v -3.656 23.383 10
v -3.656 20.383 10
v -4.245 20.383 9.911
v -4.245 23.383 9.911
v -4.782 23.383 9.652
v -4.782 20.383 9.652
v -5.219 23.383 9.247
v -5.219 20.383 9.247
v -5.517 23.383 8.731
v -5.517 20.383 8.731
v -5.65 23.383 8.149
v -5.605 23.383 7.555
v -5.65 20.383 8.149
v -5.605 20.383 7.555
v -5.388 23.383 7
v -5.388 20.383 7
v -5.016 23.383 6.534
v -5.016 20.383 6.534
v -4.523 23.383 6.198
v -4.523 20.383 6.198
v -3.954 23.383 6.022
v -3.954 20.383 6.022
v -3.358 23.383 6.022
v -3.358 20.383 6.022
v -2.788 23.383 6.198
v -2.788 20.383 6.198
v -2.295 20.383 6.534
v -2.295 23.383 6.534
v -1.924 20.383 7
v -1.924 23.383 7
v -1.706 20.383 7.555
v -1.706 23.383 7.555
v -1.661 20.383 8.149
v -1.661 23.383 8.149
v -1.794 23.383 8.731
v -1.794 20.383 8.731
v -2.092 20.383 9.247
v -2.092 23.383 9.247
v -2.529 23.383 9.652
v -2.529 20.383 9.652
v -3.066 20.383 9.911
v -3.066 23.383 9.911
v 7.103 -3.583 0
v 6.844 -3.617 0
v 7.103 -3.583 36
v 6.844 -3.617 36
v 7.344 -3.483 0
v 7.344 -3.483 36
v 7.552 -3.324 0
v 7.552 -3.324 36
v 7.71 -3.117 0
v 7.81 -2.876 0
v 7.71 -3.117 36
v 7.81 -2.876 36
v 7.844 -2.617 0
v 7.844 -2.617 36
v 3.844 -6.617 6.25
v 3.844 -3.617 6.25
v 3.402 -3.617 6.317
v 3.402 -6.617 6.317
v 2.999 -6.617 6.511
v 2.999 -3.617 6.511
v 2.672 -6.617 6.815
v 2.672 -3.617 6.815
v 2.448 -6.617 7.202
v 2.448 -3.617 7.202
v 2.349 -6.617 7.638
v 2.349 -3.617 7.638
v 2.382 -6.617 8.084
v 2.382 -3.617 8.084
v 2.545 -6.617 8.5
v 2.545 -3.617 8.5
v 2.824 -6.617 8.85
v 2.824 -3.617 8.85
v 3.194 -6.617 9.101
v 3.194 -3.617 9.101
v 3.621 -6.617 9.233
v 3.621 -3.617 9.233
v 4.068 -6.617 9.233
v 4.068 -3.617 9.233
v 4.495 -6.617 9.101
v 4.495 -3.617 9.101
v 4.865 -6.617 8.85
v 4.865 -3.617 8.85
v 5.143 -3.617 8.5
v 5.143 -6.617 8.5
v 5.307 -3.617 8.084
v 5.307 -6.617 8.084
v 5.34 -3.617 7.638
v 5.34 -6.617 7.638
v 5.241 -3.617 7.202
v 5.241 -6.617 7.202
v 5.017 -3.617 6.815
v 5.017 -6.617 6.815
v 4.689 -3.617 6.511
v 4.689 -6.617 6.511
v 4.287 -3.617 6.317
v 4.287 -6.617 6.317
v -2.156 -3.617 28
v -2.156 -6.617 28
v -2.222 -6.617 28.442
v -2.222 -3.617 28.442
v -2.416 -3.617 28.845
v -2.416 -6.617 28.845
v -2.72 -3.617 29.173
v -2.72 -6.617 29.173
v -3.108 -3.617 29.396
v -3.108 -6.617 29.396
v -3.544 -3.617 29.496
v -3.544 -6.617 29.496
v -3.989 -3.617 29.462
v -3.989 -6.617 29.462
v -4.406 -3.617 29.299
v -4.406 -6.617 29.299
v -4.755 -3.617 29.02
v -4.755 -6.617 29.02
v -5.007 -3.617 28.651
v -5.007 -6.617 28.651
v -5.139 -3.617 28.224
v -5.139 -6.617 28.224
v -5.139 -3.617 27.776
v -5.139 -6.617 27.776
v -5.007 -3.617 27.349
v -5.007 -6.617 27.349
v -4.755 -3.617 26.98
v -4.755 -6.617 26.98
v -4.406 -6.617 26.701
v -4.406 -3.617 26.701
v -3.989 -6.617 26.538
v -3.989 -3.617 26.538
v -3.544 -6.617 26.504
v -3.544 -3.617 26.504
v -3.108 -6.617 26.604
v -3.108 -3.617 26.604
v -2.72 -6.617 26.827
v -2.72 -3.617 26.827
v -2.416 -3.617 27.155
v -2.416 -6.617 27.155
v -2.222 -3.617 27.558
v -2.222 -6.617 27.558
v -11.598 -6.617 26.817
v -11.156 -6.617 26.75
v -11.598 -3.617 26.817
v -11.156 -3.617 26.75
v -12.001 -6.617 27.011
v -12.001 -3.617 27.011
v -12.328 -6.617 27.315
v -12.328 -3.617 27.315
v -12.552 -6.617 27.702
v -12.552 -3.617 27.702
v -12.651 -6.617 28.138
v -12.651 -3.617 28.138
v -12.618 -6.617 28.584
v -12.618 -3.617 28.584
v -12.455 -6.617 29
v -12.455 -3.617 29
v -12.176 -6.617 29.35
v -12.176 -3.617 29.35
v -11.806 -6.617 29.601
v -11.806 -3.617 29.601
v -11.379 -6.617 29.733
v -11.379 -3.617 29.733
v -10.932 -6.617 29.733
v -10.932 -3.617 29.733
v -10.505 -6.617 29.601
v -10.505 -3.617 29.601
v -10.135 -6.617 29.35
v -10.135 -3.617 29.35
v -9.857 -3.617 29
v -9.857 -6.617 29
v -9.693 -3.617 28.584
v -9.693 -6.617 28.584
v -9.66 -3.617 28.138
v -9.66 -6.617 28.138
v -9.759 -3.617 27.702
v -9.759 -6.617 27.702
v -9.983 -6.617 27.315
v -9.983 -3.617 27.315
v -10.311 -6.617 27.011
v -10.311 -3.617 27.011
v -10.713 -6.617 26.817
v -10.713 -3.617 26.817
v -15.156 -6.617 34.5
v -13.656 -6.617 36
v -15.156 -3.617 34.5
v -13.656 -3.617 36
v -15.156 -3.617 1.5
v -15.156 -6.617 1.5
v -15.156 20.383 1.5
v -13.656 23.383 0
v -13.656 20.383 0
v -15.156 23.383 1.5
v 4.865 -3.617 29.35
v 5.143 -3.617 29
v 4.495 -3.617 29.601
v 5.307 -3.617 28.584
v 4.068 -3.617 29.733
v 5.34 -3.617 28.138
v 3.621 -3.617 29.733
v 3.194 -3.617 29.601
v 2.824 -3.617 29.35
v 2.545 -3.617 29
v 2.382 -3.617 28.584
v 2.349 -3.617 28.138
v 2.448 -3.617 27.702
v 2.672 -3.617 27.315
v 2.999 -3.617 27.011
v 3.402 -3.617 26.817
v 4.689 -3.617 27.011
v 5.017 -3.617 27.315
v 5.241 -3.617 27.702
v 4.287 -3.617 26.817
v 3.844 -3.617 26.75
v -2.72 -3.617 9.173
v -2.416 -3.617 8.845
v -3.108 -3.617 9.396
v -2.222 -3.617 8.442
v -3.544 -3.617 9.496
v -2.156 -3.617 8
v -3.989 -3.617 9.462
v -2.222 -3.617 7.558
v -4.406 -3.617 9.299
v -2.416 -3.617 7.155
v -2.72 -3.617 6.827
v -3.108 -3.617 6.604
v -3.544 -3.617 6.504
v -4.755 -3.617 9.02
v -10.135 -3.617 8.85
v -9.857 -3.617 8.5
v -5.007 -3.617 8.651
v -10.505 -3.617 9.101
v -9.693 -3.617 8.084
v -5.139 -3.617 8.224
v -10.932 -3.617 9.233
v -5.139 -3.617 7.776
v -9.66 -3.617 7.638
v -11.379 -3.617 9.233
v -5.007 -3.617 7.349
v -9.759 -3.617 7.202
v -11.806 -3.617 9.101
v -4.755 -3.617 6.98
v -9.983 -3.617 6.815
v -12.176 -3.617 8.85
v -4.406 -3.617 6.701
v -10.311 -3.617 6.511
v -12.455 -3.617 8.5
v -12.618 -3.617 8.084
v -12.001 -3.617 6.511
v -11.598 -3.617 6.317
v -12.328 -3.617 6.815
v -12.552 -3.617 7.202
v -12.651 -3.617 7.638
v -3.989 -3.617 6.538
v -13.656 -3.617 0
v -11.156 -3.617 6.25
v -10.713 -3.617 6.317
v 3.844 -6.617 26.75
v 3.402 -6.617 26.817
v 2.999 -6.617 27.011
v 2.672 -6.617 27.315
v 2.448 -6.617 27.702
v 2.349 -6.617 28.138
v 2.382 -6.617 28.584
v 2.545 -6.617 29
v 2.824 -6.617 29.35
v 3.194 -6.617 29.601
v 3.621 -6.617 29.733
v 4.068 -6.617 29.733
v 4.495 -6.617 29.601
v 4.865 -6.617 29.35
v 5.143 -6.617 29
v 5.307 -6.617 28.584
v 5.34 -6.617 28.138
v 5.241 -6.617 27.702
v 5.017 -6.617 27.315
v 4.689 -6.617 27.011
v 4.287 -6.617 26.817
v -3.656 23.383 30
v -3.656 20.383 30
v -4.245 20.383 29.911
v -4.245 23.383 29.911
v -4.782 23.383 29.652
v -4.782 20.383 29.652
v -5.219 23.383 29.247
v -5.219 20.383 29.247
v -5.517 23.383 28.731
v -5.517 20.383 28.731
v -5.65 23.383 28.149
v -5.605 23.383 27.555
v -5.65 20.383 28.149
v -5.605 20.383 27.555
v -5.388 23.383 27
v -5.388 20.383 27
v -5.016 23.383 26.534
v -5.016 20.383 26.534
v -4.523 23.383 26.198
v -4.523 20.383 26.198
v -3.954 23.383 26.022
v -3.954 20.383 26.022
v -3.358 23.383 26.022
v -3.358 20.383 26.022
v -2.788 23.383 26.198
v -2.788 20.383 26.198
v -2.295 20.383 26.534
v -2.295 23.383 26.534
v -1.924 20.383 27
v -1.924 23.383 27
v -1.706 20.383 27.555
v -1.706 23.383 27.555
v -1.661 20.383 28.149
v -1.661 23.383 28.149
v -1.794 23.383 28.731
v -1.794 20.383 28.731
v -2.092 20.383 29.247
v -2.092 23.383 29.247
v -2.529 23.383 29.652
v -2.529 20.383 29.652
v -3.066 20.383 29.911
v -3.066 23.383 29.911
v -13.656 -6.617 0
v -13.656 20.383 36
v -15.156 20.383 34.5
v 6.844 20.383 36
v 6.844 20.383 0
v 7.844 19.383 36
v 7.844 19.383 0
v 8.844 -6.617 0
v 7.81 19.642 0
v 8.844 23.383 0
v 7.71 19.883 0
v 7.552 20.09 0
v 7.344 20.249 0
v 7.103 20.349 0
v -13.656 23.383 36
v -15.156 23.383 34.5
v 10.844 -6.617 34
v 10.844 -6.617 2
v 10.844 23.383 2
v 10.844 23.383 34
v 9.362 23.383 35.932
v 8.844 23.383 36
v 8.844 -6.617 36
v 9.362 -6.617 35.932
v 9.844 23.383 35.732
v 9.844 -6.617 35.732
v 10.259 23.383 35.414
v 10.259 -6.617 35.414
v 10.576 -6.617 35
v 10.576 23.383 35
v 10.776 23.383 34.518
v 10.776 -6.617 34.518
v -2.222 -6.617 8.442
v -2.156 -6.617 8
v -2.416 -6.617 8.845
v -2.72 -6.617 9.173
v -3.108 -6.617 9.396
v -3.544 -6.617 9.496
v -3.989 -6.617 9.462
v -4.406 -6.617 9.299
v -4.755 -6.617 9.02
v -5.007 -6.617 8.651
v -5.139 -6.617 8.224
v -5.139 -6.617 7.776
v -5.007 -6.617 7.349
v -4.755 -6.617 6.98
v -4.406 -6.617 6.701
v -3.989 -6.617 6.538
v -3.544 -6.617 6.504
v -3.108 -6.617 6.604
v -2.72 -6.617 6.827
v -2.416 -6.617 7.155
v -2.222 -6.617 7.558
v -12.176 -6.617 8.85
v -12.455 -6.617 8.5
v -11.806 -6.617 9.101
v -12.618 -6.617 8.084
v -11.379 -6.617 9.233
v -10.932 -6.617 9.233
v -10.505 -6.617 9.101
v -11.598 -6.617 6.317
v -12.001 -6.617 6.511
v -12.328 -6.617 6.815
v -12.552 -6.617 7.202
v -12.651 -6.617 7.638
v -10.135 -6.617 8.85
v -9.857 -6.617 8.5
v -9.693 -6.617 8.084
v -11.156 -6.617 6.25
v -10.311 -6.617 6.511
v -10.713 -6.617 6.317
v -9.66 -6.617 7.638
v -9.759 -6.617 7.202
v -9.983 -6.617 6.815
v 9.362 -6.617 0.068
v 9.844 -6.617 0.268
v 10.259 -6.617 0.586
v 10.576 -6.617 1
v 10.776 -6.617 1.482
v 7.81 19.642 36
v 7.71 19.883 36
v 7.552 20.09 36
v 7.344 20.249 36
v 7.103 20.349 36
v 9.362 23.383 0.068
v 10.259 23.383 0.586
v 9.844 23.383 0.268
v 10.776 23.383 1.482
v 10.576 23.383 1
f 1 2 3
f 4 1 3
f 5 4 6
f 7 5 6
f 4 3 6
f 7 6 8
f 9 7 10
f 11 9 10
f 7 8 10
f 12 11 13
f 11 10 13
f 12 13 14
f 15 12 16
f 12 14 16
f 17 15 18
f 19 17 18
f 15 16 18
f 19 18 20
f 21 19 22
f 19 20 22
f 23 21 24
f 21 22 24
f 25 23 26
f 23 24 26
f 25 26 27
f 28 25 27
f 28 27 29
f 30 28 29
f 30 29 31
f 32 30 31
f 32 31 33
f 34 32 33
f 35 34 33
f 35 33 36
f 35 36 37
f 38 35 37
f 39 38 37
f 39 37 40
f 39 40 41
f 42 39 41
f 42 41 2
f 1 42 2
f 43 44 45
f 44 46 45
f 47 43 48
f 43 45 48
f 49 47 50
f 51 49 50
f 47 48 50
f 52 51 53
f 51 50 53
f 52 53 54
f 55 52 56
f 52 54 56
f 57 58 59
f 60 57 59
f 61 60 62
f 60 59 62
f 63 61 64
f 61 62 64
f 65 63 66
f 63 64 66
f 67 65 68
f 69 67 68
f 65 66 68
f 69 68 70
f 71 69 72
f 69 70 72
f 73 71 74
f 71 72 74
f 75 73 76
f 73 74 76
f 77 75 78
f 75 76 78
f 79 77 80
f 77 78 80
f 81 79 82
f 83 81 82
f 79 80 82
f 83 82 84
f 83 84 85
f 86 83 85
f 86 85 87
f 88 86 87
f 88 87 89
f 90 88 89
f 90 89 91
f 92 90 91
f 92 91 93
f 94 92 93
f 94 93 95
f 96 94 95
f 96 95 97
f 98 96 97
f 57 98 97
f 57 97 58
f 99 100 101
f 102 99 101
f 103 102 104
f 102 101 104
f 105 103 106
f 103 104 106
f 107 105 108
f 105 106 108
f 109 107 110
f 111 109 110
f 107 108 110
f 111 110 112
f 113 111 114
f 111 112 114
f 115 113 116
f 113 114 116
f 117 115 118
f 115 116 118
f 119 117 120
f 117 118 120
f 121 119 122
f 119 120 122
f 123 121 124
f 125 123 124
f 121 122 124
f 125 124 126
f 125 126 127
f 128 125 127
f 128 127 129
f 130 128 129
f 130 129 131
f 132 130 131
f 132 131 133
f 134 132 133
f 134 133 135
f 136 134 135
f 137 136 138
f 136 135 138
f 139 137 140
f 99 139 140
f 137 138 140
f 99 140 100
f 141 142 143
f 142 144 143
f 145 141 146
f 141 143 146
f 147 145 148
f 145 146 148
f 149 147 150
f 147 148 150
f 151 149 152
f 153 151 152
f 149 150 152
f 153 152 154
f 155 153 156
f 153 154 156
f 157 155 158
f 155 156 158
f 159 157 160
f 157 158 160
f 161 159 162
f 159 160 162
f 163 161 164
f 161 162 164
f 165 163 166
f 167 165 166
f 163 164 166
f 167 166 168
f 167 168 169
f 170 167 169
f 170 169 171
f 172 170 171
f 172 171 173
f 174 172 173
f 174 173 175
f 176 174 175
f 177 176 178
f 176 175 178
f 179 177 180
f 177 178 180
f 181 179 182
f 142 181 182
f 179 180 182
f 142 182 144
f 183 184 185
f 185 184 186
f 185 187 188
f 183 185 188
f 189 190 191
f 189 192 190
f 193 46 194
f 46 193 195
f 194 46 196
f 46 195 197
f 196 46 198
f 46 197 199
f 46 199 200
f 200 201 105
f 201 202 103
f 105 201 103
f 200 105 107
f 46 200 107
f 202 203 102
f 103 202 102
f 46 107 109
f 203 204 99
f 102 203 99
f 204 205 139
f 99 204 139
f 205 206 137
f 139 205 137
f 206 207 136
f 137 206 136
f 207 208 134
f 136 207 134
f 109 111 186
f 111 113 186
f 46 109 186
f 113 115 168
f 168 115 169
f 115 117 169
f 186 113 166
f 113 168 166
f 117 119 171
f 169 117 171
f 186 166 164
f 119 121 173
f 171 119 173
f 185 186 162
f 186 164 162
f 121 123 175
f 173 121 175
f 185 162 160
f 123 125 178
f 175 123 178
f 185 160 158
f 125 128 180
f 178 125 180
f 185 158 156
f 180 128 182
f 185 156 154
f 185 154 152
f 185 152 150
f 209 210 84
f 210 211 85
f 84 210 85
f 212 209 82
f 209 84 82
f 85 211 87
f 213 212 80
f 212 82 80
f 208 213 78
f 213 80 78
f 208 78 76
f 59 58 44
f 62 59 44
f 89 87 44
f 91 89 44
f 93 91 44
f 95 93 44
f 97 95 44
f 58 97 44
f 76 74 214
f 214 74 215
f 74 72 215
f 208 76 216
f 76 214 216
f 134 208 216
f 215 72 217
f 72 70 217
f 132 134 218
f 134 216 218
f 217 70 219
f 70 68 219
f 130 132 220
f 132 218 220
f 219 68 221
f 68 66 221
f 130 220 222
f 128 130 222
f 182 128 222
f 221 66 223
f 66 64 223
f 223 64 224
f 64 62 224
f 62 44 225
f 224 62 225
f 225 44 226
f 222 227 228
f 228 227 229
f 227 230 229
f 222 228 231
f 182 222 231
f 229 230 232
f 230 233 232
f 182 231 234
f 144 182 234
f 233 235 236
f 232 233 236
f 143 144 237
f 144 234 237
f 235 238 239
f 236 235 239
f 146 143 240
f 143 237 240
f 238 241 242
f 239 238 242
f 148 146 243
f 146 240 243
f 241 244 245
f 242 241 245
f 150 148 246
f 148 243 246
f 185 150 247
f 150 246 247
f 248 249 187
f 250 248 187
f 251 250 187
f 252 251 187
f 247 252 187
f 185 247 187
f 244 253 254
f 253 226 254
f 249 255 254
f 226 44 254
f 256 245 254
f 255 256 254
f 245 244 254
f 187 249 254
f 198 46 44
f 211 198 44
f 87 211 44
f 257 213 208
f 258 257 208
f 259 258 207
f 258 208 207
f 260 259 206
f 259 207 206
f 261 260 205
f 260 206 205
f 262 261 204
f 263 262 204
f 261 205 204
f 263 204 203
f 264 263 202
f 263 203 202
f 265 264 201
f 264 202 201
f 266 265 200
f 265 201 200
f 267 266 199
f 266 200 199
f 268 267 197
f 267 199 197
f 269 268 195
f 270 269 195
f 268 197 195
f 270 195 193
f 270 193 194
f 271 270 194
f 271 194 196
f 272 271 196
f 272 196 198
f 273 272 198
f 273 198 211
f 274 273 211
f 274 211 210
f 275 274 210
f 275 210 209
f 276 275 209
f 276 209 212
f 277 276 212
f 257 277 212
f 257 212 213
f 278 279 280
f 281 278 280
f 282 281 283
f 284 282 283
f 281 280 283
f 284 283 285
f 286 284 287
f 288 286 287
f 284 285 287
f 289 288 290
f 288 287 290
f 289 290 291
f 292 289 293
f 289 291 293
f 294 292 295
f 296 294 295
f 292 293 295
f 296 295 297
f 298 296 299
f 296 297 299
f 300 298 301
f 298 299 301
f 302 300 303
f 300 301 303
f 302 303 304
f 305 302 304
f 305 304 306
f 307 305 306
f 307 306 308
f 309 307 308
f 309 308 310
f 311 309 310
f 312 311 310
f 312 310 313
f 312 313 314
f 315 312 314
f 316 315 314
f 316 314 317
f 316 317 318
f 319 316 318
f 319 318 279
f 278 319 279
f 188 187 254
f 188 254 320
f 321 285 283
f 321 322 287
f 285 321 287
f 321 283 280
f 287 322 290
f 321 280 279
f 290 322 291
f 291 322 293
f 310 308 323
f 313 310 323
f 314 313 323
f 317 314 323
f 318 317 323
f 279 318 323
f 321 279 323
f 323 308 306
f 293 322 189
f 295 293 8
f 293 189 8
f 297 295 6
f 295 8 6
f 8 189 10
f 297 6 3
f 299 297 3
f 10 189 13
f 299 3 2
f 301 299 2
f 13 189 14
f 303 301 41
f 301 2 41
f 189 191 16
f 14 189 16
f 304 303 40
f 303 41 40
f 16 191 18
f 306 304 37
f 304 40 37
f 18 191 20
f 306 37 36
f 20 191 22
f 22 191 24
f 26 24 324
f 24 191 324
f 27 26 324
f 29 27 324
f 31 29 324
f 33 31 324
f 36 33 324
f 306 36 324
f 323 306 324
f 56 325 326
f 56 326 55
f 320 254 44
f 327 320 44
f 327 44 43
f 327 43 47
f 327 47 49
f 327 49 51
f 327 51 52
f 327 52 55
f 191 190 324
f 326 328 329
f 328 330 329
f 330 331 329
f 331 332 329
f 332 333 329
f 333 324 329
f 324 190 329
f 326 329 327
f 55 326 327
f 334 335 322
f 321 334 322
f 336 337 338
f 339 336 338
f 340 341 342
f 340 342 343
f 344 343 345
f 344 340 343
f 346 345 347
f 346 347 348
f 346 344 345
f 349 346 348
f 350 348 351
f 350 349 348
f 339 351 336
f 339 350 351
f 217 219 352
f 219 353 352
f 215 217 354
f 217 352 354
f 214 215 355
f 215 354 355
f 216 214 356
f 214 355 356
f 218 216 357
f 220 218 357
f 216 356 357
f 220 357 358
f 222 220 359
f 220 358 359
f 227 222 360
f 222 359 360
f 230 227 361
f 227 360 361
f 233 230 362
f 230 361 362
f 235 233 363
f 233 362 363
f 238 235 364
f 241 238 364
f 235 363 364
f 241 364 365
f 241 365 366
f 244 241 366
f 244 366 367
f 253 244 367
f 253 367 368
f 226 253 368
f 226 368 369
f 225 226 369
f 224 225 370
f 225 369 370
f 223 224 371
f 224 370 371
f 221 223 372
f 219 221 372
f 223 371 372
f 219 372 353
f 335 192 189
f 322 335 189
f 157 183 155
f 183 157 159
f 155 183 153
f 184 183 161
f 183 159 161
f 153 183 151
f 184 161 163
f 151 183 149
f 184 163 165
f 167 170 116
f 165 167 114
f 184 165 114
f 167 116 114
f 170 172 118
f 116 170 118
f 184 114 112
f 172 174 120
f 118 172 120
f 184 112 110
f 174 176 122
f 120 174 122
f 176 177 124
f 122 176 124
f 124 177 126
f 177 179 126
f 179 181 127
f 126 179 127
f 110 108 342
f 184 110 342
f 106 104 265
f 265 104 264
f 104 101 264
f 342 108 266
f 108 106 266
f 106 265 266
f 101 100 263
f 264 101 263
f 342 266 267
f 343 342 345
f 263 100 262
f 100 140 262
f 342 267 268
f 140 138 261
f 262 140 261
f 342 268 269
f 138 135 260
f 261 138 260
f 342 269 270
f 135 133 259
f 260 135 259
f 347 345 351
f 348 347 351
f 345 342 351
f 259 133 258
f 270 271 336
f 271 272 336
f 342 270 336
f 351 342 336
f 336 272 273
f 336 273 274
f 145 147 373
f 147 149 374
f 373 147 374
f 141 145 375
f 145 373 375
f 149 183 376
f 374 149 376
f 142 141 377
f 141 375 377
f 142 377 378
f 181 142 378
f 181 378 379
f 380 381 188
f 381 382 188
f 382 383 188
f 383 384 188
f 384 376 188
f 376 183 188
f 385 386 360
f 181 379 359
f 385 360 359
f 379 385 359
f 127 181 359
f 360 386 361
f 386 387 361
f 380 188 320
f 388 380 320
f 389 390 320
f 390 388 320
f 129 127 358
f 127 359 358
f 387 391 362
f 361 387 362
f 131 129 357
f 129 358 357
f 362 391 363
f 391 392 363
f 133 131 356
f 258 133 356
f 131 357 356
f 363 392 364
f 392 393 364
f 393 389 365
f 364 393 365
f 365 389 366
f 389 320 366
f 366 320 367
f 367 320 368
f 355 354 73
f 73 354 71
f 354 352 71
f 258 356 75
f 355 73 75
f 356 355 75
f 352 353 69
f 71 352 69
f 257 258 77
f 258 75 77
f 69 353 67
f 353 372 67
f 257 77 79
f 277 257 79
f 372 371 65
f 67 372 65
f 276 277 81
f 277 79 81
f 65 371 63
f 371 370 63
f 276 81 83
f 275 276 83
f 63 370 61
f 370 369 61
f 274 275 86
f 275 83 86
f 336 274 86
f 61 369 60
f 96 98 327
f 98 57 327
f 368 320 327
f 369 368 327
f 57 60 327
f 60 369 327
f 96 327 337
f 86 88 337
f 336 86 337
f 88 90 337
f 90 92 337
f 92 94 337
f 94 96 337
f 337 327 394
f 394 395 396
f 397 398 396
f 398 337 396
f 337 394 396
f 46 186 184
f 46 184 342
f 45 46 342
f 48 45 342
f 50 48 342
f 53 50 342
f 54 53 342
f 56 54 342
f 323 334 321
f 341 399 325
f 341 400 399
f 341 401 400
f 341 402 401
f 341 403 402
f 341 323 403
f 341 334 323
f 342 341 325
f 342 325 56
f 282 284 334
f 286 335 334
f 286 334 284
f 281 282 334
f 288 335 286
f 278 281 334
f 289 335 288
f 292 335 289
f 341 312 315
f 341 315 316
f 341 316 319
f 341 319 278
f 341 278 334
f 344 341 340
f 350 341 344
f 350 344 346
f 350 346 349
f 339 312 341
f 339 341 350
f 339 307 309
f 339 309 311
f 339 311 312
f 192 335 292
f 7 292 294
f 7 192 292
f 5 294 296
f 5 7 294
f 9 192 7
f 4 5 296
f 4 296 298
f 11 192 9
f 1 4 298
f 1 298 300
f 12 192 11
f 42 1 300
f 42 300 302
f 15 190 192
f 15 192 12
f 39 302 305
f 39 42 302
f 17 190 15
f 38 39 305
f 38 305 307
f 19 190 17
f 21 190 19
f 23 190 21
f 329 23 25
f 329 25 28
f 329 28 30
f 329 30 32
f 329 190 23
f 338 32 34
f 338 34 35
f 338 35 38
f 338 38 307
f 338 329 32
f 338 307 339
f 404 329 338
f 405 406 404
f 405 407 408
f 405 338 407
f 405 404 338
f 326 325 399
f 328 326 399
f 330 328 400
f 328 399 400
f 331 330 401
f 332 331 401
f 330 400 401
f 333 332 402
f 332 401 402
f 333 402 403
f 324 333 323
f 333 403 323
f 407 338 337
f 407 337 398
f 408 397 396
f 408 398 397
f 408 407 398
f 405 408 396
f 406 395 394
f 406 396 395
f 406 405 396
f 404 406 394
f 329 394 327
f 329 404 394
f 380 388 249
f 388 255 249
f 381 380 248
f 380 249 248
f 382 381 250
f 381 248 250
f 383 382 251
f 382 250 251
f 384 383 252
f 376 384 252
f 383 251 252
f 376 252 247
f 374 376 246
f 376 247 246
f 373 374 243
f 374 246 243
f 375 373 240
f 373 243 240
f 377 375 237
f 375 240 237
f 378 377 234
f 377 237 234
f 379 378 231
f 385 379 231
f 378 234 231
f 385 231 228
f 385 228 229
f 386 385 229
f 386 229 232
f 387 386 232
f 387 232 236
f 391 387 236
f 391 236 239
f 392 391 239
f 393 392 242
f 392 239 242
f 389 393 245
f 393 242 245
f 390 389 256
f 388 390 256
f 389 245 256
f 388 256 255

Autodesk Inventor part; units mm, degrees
ref_plane "YZ Plane" through (0, 0, 0) normal (1, 0, 0) x (0, 1, 0)
ref_plane "XZ Plane" through (0, 0, 0) normal (0, 1, 0) x (-1, 0, 0)
ref_plane "XY Plane" through (0, 0, 0) normal (0, 0, 1) x (1, 0, 0)
sketch "Szkic1" plane through (0, 0, 0) normal (0, 0, 1) x (1, 0, 0)
  line L0 (-15.1556, -3.6171) -> (-15.1556, -6.6171)
  line L1 (-15.1556, -6.6171) -> (10.8444, -6.6171)
  line L2 (10.8444, -6.6171) -> (10.8444, 23.3829)
  line L3 (7.8444, 20.3829) -> (7.8444, -3.6171)
  line L4 (7.8444, -3.6171) -> (-15.1556, -3.6171)
  line L5 (-15.1556, 23.3829) -> (-15.1556, 20.3829)
  line L6 (-15.1556, 20.3829) -> (7.8444, 20.3829)
  line L7 (-15.1556, 23.3829) -> (10.8444, 23.3829)
  point P0 (0, 0)
  dimension "d1" = 26
  dimension "d2" = 30
  dimension "d87" = 3
  dimension "d88" = 24
  dimension "d89" = 3
  dimension "d90" = 3
extrude "Wyciągnięcie proste1" add sketch "Szkic1" along normal blind 36
fillet "Zaokrąglenie1" radius 1 2 edges at (7.8444, -3.6171, 18) (7.8444, 20.3829, 18)
chamfer "Faza4" distance 1.5 angle 45 4 edges at (-15.1556, -5.1171, 36) (-15.1556, -5.1171, 0) (-15.1556, 21.8829, 36) (-15.1556, 21.8829, 0)
fillet "Zaokrąglenie5" radius 2 2 edges at (10.8444, 8.3829, 36) (10.8444, 8.3829, 0)
sketch "Szkic7" plane through (-15.1556, -6.6171, 1.5) normal (0, -1, 0) x (1, 0, 0)
  arc A0 (24, -1.5) -> (26, 0.5) centre (24, 0.5) ccw projected
  line L0 (26, 0.5) -> (26, 32.5) projected
  arc A1 (26, 32.5) -> (24, 34.5) centre (24, 32.5) ccw projected
  line L1 (1.5, 34.5) -> (24, 34.5) projected
  line L2 (0, 33) -> (1.5, 34.5) projected
  line L3 (0, 0) -> (0, 33) projected
  line L4 (1.5, -1.5) -> (0, 0) projected
  line L5 (1.5, -1.5) -> (24, -1.5) projected
  line L6 (23, 34.5) -> (23, -1.5) projected
  point P0 (15.1556, -1.5)
  point P1 (19, 6.25)
  point P2 (4, 6.25)
  point P3 (4, 26.75)
  point P4 (19, 26.75)
  dimension "d95" = 4
  dimension "d96" = 4
  dimension "d97" = 4
  dimension "d98" = 4
  dimension "d99" = 7.75
  dimension "d100" = 7.75
  dimension "d101" = 7.75
  dimension "d102" = 7.75
hole "Otwór5" at (3.8444, -6.6171, 7.75) at (-11.1556, -6.6171, 7.75) at (-11.1556, -6.6171, 28.25) at (3.8444, -6.6171, 28.25) direction (0, 1, 0) diameter 3 depth 8 tip angle 118
sketch "Szkic8" plane through (-15.1556, 23.3829, 34.5) normal (0, 1, 0) x (1, 0, 0)
  arc A0 (26, 32.5) -> (24, 34.5) centre (24, 32.5) ccw projected
  line L0 (24, 34.5) -> (1.5, 34.5) projected
  line L1 (0, 33) -> (1.5, 34.5) projected
  line L2 (0, 33) -> (0, 0) projected
  line L3 (1.5, -1.5) -> (0, 0) projected
  line L4 (24, -1.5) -> (1.5, -1.5) projected
  arc A1 (24, -1.5) -> (26, 0.5) centre (24, 0.5) ccw projected
  line L5 (26, 32.5) -> (26, 0.5) projected
  line L6 (23, 34.5) -> (23, -1.5) projected
  point P0 (15.1556, 34.5)
  point P1 (11.5, 26.5)
  point P2 (11.5, 6.5)
  dimension "d110" = 11.5
  dimension "d111" = 23
  dimension "d112" = 11.5
  dimension "d113" = 20
  dimension "d114" = 36
  dimension "d115" = 8
hole "Otwór6" at (-3.6556, 23.3829, 8) at (-3.6556, 23.3829, 28) direction (0, -1, 0) diameter 4 depth 8 tip angle 118
sketch "Szkic9" plane through (-15.1556, -6.6171, 1.5) normal (0, -1, 0) x (1, 0, 0)
  circle A0 centre (11.5, 6.5) radius 2 projected
  circle A1 centre (11.5, 26.5) radius 2 projected
  circle A2 centre (11.5, 6.5) radius 1.5
  circle A3 centre (11.5, 26.5) radius 1.5
  point P0 (15.1556, -1.5)
  dimension "d123" = 3
  dimension "d124" = 3
extrude "Wyciągnięcie proste4" cut sketch "Szkic9" against normal blind 10 contours A2 | A3
equation "\"d88\" = d2 - 2 * d87"
equation "\"d97\" = d95"
equation "\"d98\" = d96"
equation "\"d100\" = d99"
equation "\"d101\" = d99"
equation "\"d102\" = d99"
equation "\"d110\" = 0.5 * d111"
equation "\"d112\" = d110"
equation "\"d115\" = -0.5 * d113 + 0.5 * d114"
properties part number "CNCM_ALU_Y_Axis_Belt_Mount_Bracket"
